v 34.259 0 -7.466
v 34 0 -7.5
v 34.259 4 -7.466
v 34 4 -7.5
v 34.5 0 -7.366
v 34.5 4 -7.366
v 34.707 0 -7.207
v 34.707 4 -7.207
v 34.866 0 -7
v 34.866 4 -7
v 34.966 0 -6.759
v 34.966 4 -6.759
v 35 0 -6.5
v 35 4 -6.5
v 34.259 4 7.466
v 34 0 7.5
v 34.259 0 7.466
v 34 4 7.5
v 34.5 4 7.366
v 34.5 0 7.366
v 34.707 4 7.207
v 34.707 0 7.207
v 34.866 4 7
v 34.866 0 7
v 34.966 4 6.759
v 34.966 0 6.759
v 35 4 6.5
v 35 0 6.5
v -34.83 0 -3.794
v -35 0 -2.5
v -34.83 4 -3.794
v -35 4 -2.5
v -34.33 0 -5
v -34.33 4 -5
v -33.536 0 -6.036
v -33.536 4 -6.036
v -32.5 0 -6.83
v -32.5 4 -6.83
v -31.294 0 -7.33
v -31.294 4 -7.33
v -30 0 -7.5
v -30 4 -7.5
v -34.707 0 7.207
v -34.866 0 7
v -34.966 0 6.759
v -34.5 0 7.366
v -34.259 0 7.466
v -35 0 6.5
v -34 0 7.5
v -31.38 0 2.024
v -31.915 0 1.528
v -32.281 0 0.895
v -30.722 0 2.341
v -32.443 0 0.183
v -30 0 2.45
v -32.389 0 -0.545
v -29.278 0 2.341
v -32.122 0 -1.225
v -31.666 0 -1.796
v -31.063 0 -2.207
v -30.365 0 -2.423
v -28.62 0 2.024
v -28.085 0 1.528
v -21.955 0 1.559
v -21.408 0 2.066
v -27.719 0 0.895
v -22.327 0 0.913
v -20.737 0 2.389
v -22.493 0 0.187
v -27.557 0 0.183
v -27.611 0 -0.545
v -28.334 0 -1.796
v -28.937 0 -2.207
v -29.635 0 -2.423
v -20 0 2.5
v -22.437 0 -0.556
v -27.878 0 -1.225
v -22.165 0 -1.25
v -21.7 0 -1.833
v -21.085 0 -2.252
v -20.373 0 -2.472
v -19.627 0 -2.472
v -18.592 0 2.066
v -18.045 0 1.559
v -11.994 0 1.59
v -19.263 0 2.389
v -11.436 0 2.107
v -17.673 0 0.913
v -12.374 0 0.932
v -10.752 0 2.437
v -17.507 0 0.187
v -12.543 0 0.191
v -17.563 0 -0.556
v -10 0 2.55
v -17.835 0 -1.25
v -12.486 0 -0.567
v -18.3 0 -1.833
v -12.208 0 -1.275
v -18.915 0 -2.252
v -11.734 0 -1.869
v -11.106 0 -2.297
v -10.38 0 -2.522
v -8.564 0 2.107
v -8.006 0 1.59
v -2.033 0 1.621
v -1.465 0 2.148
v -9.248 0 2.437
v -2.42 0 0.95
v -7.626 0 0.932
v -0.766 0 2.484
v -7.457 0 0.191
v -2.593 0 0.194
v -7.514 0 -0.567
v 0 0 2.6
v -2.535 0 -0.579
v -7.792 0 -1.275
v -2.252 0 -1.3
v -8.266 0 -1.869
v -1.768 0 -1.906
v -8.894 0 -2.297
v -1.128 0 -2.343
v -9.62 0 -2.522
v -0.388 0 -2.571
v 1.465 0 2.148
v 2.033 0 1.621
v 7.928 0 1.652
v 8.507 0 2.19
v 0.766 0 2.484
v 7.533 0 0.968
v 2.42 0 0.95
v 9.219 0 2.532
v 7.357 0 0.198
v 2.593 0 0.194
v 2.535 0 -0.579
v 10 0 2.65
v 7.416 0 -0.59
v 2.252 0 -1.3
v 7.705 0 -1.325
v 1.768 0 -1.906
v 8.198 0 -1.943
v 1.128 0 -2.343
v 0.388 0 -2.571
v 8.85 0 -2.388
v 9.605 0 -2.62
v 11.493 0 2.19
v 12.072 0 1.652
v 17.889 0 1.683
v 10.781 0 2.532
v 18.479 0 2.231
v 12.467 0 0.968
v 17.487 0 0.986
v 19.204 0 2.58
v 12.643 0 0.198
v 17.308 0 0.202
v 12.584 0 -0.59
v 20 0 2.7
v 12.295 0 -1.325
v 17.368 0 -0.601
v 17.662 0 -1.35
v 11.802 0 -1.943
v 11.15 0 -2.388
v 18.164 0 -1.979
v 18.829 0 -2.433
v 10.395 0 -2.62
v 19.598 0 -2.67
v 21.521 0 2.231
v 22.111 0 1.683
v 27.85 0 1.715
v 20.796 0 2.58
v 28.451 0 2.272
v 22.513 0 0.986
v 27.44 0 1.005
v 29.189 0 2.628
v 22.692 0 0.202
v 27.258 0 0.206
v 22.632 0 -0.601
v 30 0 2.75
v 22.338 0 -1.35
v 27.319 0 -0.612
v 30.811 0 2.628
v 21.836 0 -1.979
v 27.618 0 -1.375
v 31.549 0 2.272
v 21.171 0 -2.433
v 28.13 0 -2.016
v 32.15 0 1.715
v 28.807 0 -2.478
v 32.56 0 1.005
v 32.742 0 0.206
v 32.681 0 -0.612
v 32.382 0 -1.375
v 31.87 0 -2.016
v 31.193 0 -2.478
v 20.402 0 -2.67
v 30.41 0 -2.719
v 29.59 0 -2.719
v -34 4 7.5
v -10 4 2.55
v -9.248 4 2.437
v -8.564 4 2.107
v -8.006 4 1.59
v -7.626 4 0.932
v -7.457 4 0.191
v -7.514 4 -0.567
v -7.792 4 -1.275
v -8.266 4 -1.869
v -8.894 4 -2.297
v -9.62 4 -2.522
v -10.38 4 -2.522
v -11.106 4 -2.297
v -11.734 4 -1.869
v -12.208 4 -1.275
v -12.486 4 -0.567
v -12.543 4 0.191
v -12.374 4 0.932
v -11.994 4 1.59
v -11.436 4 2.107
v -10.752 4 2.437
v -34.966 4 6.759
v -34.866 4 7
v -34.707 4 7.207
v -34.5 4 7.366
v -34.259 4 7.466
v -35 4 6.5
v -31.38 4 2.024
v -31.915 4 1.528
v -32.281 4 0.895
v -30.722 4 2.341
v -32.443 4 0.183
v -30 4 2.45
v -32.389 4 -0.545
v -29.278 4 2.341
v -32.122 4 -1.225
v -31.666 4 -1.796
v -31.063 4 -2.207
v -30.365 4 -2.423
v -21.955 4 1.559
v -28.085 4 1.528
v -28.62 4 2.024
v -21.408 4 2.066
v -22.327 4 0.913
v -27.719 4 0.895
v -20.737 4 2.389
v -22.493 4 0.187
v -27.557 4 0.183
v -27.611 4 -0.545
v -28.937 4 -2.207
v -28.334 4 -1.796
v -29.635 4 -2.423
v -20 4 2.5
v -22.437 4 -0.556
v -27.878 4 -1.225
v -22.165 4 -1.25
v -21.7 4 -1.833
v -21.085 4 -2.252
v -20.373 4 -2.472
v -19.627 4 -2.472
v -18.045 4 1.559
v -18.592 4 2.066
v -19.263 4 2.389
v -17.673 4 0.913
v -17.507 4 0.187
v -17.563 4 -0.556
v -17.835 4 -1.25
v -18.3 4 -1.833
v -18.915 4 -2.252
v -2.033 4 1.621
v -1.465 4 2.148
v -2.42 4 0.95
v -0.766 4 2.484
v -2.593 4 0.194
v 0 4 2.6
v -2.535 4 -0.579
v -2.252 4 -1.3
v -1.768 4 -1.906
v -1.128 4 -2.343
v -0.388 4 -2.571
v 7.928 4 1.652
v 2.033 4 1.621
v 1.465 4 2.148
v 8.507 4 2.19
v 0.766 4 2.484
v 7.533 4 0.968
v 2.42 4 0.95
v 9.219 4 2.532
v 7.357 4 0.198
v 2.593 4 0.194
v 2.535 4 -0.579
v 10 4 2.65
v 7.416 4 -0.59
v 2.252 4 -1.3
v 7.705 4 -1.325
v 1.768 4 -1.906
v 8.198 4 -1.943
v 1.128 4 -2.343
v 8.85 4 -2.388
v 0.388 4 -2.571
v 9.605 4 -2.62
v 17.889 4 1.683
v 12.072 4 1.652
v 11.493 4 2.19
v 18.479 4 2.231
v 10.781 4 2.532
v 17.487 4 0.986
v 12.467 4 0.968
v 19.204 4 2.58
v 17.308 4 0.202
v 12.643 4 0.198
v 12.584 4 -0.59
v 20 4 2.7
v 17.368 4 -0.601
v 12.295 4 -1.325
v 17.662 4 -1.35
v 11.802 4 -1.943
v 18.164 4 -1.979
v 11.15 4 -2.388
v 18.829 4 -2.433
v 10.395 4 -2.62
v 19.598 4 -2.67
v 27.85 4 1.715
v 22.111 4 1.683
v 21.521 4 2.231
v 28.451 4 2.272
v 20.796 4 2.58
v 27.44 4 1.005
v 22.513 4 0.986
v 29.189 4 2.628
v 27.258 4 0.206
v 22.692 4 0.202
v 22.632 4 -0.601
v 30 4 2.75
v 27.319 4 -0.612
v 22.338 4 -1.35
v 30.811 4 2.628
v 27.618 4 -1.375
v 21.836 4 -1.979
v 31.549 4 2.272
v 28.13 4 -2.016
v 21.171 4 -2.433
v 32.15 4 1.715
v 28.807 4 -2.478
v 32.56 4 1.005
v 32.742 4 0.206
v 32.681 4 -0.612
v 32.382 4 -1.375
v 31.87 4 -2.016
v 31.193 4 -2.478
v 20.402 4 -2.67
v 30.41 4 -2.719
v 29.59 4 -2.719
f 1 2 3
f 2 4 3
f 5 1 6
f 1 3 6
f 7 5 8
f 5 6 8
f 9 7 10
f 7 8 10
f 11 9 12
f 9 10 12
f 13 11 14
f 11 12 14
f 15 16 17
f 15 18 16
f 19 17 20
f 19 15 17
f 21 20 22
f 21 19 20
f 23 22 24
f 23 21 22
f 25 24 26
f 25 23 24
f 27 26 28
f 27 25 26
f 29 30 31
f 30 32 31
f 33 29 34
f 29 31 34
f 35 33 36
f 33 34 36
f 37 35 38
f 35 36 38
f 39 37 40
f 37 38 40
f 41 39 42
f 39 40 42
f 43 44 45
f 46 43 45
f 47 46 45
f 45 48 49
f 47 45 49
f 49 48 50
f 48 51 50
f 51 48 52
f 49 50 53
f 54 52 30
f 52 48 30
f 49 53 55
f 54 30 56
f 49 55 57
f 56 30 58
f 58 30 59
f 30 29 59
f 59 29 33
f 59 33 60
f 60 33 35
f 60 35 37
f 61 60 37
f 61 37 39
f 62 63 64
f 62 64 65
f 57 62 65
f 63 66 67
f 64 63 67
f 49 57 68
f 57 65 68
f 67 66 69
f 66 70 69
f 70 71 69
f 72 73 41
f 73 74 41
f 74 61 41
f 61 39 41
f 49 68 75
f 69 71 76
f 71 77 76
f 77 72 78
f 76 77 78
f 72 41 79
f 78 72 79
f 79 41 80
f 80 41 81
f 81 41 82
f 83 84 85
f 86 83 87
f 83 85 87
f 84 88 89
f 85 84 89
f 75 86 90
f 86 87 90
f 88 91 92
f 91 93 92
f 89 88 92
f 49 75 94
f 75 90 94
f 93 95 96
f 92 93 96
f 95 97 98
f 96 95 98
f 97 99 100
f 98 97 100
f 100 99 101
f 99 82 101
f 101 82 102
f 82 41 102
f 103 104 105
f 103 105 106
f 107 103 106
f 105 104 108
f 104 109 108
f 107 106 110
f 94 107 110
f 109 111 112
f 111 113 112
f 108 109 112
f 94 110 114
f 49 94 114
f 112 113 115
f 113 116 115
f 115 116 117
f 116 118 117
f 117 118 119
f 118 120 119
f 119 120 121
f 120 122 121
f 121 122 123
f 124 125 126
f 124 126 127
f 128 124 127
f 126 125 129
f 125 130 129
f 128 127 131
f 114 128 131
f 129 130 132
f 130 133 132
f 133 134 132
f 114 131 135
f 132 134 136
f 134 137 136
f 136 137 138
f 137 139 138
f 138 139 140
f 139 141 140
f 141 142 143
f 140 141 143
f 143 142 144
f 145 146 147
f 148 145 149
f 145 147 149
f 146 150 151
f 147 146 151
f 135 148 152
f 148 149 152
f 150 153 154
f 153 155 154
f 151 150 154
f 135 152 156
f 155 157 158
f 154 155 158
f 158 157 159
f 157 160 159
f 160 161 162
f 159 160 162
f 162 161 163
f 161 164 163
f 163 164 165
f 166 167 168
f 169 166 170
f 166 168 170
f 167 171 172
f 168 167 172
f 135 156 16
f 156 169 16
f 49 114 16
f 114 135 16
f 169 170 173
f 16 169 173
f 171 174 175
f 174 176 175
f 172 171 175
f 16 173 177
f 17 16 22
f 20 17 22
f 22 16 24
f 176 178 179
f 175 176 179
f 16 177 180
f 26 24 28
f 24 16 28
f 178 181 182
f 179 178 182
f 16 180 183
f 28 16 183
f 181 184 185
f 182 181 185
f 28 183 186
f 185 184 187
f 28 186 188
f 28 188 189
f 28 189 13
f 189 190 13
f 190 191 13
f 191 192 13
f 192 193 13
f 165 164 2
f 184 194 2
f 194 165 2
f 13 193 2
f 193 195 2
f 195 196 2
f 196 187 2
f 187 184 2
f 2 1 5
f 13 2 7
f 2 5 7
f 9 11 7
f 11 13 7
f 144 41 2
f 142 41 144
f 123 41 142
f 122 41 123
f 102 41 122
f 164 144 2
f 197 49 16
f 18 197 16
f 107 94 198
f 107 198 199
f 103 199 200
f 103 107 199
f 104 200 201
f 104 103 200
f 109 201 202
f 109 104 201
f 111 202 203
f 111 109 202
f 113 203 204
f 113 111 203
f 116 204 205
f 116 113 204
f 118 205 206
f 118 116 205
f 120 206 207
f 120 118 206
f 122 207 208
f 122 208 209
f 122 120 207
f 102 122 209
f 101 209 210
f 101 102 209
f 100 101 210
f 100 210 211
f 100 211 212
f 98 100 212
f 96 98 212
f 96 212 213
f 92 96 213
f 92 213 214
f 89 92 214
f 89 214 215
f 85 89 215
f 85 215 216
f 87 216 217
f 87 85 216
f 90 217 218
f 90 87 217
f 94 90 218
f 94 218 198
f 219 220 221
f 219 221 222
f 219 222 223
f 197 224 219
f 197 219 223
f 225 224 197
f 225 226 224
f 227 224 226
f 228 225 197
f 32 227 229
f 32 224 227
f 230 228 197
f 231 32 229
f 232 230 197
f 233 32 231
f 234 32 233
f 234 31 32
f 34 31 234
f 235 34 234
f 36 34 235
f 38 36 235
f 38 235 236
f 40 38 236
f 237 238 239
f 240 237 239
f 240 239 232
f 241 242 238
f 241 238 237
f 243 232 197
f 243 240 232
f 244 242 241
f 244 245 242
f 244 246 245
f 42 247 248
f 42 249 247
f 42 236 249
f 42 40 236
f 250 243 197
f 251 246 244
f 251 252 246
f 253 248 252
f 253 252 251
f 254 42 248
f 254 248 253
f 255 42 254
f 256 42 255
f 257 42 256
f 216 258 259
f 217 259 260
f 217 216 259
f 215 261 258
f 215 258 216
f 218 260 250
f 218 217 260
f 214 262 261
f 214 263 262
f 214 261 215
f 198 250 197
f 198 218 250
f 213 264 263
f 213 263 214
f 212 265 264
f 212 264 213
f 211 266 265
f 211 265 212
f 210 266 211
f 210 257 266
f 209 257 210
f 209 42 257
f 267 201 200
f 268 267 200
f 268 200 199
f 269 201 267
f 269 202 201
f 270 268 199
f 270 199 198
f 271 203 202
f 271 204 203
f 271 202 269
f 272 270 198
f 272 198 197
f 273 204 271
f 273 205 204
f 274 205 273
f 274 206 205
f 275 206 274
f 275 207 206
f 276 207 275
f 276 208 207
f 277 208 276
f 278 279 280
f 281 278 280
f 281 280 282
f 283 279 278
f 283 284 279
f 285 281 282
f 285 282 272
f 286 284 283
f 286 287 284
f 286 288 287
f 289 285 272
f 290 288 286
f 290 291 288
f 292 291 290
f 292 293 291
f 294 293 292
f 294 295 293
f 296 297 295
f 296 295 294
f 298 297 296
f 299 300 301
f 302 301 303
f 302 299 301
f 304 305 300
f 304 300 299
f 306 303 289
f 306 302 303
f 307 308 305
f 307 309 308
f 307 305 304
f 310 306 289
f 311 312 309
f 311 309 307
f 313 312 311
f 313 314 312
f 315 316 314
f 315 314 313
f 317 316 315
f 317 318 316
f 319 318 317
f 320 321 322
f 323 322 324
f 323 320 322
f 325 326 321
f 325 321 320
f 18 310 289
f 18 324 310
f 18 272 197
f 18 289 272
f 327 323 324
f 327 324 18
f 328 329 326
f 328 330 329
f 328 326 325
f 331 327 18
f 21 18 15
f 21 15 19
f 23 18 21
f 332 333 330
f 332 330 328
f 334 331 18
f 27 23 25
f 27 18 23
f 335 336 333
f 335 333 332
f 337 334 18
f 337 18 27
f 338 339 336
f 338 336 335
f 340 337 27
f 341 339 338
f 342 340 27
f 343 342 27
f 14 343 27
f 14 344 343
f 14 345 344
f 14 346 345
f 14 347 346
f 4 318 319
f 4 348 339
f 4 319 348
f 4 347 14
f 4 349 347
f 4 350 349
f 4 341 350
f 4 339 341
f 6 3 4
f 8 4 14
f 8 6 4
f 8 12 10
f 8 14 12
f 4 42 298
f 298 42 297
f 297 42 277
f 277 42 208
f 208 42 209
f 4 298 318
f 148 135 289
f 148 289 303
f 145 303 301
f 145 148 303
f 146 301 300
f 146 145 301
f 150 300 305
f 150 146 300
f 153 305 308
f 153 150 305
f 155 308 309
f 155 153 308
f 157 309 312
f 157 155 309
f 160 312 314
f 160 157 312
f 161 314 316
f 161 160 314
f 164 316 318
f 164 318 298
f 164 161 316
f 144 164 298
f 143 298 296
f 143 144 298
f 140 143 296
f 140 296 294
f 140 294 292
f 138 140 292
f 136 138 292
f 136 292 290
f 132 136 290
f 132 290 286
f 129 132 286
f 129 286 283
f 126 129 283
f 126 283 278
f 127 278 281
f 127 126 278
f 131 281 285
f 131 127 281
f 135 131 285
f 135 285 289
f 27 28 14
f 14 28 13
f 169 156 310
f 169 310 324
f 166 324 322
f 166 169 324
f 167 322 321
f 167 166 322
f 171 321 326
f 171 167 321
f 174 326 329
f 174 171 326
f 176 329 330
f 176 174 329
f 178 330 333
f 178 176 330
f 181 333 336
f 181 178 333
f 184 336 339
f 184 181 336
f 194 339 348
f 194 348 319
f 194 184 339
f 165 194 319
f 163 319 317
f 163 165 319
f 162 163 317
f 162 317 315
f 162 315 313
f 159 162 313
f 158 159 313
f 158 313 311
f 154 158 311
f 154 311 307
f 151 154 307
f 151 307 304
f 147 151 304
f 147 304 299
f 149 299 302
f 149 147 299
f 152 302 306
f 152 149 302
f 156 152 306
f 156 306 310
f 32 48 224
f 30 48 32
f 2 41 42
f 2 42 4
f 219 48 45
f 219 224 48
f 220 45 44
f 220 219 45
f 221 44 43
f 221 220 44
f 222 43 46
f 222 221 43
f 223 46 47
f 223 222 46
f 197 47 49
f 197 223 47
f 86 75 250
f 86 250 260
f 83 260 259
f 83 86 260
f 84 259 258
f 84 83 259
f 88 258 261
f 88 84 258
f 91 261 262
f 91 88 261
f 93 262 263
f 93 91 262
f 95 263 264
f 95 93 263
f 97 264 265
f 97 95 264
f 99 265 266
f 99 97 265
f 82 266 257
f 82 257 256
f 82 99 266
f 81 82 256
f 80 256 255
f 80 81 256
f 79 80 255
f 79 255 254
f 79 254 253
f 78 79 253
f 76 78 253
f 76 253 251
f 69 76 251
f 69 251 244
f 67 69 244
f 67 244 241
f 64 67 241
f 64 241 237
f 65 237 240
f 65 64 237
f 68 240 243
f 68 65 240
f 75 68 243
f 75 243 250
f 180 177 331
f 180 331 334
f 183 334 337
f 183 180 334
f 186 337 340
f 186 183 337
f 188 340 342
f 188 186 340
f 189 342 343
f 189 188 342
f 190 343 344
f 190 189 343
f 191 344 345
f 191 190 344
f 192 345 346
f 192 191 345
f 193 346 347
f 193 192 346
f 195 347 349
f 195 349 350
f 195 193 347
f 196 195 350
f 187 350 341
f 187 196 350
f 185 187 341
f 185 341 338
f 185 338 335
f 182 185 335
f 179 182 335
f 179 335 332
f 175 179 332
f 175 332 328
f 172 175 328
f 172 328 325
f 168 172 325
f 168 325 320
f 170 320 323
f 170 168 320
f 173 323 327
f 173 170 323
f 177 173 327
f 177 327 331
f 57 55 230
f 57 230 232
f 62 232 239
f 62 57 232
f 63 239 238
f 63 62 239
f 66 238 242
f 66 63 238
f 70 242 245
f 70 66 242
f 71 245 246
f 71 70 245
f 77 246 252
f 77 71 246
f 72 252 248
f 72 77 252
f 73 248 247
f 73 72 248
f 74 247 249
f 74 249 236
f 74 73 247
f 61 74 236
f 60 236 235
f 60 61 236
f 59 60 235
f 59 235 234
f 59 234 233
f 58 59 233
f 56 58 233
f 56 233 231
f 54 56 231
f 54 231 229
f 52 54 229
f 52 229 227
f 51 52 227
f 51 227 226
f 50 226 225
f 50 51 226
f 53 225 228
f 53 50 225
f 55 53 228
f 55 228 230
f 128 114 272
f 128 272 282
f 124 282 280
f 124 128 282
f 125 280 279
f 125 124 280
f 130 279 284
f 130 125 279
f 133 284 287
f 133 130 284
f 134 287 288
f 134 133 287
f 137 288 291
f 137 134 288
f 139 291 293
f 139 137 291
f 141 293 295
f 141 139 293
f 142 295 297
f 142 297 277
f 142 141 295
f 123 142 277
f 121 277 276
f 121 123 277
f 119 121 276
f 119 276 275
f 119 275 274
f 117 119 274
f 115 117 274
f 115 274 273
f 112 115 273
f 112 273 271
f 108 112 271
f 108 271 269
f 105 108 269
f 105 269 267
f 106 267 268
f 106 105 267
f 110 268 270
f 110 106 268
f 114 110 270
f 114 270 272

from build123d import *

# Parameters (mm, degrees)
SKETCH1_W           = 70
SKETCH1_H           = 15
SKETCH1_R           = 2.45
SKETCH1_R_2         = 2.5
SKETCH1_R_3         = 2.55
SKETCH1_R_4         = 2.6
SKETCH1_R_5         = 2.65
SKETCH1_R_6         = 2.7
SKETCH1_R_7         = 2.75
BOSS_EXTRUDE1_DEPTH = 4
FILLET1_R           = 5
FILLET2_R           = 1


with BuildPart() as part:
    # Sketch1 → Boss-Extrude1 (new body)
    with BuildSketch(Plane(origin=(0, 0, 0), x_dir=(1, 0, 0), z_dir=(0, 1, 0))):
        Rectangle(SKETCH1_W, SKETCH1_H)
        with Locations(Location((-30, 0, 0), (0, 0, 270))):
            Circle(SKETCH1_R, mode=Mode.SUBTRACT)
        with Locations(Location((-20, 0, 0), (0, 0, 270))):
            Circle(SKETCH1_R_2, mode=Mode.SUBTRACT)
        with Locations(Location((-10, 0, 0), (0, 0, 270))):
            Circle(SKETCH1_R_3, mode=Mode.SUBTRACT)
        with Locations(Location((0, 0, 0), (0, 0, 270))):
            Circle(SKETCH1_R_4, mode=Mode.SUBTRACT)
        with Locations(Location((10, 0, 0), (0, 0, 270))):
            Circle(SKETCH1_R_5, mode=Mode.SUBTRACT)
        with Locations(Location((20, 0, 0), (0, 0, 270))):
            Circle(SKETCH1_R_6, mode=Mode.SUBTRACT)
        with Locations(Location((30, 0, 0), (0, 0, 270))):
            Circle(SKETCH1_R_7, mode=Mode.SUBTRACT)
    extrude(amount=BOSS_EXTRUDE1_DEPTH)

    # Fillet1
    fillet1_edges = [part.edges().sort_by_distance(p)[0] for p in [
        (-35, 2, -7.5),
    ]]
    fillet(fillet1_edges, radius=FILLET1_R)

    # Fillet2
    fillet2_edges = [part.edges().sort_by_distance(p)[0] for p in [
        (35, 2, 7.5),
        (-35, 2, 7.5),
        (35, 2, -7.5),
    ]]
    fillet(fillet2_edges, radius=FILLET2_R)


solid = part.part
